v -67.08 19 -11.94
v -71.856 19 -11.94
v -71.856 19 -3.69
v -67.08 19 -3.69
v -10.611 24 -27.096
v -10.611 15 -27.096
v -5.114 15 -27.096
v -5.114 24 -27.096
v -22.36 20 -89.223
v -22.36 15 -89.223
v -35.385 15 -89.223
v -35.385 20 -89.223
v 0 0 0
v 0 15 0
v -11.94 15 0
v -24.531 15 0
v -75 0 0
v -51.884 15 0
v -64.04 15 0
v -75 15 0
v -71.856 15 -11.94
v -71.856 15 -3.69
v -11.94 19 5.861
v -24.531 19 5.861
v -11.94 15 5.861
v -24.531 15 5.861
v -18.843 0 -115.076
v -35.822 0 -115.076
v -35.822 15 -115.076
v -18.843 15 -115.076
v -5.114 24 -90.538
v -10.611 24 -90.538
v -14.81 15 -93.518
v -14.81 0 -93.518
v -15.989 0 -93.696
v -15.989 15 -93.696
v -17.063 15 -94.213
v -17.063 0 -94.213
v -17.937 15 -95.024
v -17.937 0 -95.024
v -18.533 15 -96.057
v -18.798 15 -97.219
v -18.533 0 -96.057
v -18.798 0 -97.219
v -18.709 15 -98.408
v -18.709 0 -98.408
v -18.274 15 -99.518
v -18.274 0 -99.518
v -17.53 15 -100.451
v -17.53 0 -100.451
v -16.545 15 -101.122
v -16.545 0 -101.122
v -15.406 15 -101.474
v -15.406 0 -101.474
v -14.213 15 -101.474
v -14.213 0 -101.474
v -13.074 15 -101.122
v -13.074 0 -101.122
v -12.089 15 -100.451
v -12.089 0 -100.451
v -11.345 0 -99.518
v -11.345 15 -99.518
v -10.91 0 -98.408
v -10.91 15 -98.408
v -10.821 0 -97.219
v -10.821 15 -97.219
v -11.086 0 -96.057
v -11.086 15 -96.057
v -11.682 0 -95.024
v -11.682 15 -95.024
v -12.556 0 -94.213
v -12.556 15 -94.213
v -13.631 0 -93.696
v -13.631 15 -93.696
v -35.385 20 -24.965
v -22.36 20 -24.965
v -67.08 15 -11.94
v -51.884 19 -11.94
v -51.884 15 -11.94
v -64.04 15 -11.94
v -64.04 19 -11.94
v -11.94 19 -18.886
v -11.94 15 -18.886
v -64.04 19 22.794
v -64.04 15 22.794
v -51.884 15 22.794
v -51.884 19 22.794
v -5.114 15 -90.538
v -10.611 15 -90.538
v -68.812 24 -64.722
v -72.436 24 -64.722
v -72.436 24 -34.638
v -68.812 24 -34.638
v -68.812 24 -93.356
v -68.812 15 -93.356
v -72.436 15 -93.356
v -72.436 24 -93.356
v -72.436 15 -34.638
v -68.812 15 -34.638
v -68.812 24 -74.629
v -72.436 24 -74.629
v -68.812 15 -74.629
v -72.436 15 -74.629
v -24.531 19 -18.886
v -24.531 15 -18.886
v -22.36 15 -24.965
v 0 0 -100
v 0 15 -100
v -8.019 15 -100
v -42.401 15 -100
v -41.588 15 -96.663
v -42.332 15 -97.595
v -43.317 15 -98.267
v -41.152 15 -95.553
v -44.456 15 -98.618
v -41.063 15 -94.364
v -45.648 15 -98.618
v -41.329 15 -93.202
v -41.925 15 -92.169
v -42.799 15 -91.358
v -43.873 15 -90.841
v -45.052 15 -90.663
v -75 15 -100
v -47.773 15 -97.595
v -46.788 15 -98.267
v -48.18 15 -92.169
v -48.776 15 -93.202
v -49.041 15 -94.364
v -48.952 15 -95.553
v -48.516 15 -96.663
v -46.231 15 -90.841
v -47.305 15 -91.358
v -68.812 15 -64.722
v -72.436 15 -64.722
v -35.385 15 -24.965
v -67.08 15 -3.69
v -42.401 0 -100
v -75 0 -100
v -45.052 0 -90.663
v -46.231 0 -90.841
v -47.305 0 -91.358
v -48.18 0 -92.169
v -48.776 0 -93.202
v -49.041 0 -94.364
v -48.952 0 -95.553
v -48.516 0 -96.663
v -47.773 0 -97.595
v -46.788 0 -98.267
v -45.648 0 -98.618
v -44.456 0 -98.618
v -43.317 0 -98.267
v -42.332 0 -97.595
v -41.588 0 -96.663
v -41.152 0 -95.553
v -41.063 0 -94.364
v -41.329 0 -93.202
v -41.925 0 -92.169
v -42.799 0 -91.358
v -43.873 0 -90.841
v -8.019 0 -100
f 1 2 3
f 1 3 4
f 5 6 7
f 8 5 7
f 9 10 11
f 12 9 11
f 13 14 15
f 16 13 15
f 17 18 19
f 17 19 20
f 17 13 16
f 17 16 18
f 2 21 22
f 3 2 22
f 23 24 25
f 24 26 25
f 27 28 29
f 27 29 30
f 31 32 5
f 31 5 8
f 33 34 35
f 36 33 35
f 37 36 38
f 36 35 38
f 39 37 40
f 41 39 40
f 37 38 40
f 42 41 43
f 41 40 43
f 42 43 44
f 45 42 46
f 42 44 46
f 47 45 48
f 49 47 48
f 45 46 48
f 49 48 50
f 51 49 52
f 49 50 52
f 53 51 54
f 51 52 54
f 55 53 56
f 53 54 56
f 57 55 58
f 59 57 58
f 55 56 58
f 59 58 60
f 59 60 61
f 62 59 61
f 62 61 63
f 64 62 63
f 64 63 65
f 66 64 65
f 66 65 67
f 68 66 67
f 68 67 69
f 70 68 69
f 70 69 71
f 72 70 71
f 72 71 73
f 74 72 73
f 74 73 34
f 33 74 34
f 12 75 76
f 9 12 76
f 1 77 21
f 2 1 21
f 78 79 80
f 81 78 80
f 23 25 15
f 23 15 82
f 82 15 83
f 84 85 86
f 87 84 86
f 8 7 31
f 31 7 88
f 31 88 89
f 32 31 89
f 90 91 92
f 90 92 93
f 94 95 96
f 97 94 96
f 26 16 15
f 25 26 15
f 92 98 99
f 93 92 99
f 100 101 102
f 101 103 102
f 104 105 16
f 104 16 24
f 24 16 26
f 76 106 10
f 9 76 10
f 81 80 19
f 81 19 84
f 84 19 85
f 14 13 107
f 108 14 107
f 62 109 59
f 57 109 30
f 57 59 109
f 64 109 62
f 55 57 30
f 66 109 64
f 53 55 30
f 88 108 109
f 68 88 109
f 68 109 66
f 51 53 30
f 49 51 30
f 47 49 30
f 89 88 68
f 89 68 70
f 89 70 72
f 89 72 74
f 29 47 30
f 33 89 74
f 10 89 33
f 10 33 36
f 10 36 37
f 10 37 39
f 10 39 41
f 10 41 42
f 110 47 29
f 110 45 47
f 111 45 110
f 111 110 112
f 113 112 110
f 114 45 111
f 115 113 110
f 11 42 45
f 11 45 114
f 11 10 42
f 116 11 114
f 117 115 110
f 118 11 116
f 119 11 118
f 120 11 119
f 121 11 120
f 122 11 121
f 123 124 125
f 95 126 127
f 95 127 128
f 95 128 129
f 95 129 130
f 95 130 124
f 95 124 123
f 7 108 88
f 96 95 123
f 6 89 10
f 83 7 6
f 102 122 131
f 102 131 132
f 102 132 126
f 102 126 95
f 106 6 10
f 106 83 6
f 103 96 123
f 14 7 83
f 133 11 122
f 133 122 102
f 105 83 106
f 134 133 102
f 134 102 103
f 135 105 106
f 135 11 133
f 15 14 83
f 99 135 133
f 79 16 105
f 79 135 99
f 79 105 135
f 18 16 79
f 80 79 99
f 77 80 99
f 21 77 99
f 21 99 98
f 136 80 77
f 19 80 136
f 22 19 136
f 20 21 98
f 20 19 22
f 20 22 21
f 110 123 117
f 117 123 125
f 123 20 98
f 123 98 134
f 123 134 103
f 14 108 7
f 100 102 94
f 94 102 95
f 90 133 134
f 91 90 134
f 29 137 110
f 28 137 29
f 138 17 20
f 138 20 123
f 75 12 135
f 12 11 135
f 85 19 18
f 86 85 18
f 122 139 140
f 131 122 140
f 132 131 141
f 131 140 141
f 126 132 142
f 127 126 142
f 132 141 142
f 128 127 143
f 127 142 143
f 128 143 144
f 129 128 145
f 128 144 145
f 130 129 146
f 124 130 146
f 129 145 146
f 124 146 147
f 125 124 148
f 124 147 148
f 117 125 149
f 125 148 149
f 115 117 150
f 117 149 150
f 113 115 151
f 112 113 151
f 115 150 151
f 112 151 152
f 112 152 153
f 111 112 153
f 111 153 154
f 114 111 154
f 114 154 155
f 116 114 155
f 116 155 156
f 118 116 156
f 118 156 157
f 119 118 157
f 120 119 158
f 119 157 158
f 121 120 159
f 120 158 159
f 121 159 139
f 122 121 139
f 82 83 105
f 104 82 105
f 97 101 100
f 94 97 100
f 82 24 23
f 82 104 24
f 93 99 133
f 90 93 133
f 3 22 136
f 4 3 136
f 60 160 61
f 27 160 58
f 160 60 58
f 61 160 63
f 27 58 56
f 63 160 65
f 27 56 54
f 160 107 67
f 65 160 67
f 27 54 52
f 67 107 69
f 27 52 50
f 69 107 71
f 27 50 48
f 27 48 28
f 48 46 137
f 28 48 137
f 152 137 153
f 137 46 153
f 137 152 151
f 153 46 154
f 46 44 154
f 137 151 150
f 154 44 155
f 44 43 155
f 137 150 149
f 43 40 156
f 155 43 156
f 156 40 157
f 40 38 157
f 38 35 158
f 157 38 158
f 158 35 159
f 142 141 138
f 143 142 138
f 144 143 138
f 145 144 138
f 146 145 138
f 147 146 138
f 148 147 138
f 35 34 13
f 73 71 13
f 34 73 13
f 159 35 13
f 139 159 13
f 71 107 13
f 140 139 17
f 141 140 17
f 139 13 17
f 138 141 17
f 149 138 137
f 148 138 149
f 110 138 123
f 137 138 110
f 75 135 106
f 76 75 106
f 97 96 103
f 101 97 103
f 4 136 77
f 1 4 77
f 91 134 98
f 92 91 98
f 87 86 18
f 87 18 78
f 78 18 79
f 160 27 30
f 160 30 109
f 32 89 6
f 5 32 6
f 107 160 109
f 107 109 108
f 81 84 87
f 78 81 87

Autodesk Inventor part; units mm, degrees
ref_plane "YZ Plane" through (0, 0, 0) normal (1, 0, 0) x (0, 1, 0)
ref_plane "XZ Plane" through (0, 0, 0) normal (0, 1, 0) x (-1, 0, 0)
ref_plane "XY Plane" through (0, 0, 0) normal (0, 0, 1) x (1, 0, 0)
sketch "Sketch1" plane through (0, 0, 0) normal (0, 1, 0) x (-1, 0, 0)
  line L0 (0, 0) -> (0, -100)
  line L1 (0, 0) -> (75, 0)
  line L2 (75, 0) -> (75, -100)
  line L3 (75, -100) -> (42.4007, -100)
  line L4 (42.4007, -100) -> (35.8215, -115.0757)
  line L5 (35.8215, -115.0757) -> (18.8427, -115.0757)
  line L6 (18.8427, -115.0757) -> (8.0187, -100)
  line L7 (8.0187, -100) -> (0, -100)
  dimension "d0" = 100
  dimension "d1" = 75
extrude "Extrusion1" add sketch "Sketch1" along normal blind 15
sketch "Sketch2" plane through (0, 15, 0) normal (0, 1, 0) x (1, 0, 0)
  line L0 (-72.4361, 34.6384) -> (-68.8116, 34.6384)
  line L1 (-68.8116, 34.6384) -> (-68.8116, 64.722)
  line L2 (-68.8116, 64.722) -> (-72.4361, 64.722)
  line L3 (-72.4361, 64.722) -> (-72.4361, 34.6384)
  line L4 (-72.4361, 74.6291) -> (-68.8116, 74.6291)
  line L5 (-68.8116, 74.6291) -> (-68.8116, 93.3558)
  line L6 (-68.8116, 93.3558) -> (-72.4361, 93.3558)
  line L7 (-72.4361, 93.3558) -> (-72.4361, 74.6291)
  point P0 (0, 0)
extrude "Extrusion2" add sketch "Sketch2" along normal blind 9
sketch "Sketch3" plane through (0, 15, 0) normal (0, 1, 0) x (1, 0, 0)
  line L0 (-10.6109, 27.0955) -> (-5.1141, 27.0955)
  line L1 (-5.1141, 27.0955) -> (-5.1141, 90.5375)
  line L2 (-5.1141, 90.5375) -> (-10.6109, 90.5375)
  line L3 (-10.6109, 90.5375) -> (-10.6109, 27.0955)
  point P0 (0, 0)
extrude "Extrusion3" add sketch "Sketch3" along normal blind 9
sketch "Sketch4" plane through (0, 15, 0) normal (0, 1, 0) x (1, 0, 0)
  line L0 (-24.5308, -5.8613) -> (-11.9398, -5.8613)
  line L1 (-11.9398, -5.8613) -> (-11.9398, 18.8865)
  line L2 (-11.9398, 18.8865) -> (-24.5308, 18.8865)
  line L3 (-24.5308, 18.8865) -> (-24.5308, -5.8613)
  line L4 (-64.0405, -22.7941) -> (-51.8837, -22.7941)
  line L5 (-51.8837, -22.7941) -> (-51.8837, 11.9398)
  line L6 (-51.8837, 11.9398) -> (-64.0405, 11.9398)
  line L7 (-64.0405, 11.9398) -> (-64.0405, -22.7941)
  line L8 (-71.8556, 3.6905) -> (-67.0797, 3.6905)
  line L9 (-67.0797, 3.6905) -> (-67.0797, 11.9398)
  line L10 (-67.0797, 11.9398) -> (-71.8556, 11.9398)
  line L11 (-71.8556, 11.9398) -> (-71.8556, 3.6905)
  point P0 (0, 0)
extrude "Extrusion4" add sketch "Sketch4" along normal blind 4
sketch "Sketch5" plane through (0, 15, 0) normal (0, 1, 0) x (1, 0, 0)
  line L0 (-35.3851, 24.965) -> (-22.3599, 24.965)
  line L1 (-22.3599, 24.965) -> (-22.3599, 89.2226)
  line L2 (-22.3599, 89.2226) -> (-35.3851, 89.2226)
  line L3 (-35.3851, 89.2226) -> (-35.3851, 24.965)
  point P0 (0, 0)
extrude "Extrusion5" add sketch "Sketch5" along normal blind 5
sketch "Sketch6" plane through (0, 15, 0) normal (0, 1, 0) x (1, 0, 0)
  line L0 (-62.9909, 21.9257) -> (-62.9909, 90.0836) construction
  line L1 (-62.9909, 90.0836) -> (-37.1661, 90.0836) construction
  line L2 (-37.1661, 90.0836) -> (-37.1661, 21.9257) construction
  line L3 (-37.1661, 21.9257) -> (-62.9909, 21.9257) construction
  point P0 (0, 0)
sketch "Sketch7" plane through (0, 15, 0) normal (0, 1, 0) x (1, 0, 0)
  point P0 (0, 0)
  point P1 (-14.8096, 97.5183)
  point P2 (-45.0522, 94.6629)
hole "Hole1" at (-14.8096, 15, -97.5183) at (-45.0522, 15, -94.6629) direction (0, -1, 0) diameter 8 end through all
properties part number "arduino now"
